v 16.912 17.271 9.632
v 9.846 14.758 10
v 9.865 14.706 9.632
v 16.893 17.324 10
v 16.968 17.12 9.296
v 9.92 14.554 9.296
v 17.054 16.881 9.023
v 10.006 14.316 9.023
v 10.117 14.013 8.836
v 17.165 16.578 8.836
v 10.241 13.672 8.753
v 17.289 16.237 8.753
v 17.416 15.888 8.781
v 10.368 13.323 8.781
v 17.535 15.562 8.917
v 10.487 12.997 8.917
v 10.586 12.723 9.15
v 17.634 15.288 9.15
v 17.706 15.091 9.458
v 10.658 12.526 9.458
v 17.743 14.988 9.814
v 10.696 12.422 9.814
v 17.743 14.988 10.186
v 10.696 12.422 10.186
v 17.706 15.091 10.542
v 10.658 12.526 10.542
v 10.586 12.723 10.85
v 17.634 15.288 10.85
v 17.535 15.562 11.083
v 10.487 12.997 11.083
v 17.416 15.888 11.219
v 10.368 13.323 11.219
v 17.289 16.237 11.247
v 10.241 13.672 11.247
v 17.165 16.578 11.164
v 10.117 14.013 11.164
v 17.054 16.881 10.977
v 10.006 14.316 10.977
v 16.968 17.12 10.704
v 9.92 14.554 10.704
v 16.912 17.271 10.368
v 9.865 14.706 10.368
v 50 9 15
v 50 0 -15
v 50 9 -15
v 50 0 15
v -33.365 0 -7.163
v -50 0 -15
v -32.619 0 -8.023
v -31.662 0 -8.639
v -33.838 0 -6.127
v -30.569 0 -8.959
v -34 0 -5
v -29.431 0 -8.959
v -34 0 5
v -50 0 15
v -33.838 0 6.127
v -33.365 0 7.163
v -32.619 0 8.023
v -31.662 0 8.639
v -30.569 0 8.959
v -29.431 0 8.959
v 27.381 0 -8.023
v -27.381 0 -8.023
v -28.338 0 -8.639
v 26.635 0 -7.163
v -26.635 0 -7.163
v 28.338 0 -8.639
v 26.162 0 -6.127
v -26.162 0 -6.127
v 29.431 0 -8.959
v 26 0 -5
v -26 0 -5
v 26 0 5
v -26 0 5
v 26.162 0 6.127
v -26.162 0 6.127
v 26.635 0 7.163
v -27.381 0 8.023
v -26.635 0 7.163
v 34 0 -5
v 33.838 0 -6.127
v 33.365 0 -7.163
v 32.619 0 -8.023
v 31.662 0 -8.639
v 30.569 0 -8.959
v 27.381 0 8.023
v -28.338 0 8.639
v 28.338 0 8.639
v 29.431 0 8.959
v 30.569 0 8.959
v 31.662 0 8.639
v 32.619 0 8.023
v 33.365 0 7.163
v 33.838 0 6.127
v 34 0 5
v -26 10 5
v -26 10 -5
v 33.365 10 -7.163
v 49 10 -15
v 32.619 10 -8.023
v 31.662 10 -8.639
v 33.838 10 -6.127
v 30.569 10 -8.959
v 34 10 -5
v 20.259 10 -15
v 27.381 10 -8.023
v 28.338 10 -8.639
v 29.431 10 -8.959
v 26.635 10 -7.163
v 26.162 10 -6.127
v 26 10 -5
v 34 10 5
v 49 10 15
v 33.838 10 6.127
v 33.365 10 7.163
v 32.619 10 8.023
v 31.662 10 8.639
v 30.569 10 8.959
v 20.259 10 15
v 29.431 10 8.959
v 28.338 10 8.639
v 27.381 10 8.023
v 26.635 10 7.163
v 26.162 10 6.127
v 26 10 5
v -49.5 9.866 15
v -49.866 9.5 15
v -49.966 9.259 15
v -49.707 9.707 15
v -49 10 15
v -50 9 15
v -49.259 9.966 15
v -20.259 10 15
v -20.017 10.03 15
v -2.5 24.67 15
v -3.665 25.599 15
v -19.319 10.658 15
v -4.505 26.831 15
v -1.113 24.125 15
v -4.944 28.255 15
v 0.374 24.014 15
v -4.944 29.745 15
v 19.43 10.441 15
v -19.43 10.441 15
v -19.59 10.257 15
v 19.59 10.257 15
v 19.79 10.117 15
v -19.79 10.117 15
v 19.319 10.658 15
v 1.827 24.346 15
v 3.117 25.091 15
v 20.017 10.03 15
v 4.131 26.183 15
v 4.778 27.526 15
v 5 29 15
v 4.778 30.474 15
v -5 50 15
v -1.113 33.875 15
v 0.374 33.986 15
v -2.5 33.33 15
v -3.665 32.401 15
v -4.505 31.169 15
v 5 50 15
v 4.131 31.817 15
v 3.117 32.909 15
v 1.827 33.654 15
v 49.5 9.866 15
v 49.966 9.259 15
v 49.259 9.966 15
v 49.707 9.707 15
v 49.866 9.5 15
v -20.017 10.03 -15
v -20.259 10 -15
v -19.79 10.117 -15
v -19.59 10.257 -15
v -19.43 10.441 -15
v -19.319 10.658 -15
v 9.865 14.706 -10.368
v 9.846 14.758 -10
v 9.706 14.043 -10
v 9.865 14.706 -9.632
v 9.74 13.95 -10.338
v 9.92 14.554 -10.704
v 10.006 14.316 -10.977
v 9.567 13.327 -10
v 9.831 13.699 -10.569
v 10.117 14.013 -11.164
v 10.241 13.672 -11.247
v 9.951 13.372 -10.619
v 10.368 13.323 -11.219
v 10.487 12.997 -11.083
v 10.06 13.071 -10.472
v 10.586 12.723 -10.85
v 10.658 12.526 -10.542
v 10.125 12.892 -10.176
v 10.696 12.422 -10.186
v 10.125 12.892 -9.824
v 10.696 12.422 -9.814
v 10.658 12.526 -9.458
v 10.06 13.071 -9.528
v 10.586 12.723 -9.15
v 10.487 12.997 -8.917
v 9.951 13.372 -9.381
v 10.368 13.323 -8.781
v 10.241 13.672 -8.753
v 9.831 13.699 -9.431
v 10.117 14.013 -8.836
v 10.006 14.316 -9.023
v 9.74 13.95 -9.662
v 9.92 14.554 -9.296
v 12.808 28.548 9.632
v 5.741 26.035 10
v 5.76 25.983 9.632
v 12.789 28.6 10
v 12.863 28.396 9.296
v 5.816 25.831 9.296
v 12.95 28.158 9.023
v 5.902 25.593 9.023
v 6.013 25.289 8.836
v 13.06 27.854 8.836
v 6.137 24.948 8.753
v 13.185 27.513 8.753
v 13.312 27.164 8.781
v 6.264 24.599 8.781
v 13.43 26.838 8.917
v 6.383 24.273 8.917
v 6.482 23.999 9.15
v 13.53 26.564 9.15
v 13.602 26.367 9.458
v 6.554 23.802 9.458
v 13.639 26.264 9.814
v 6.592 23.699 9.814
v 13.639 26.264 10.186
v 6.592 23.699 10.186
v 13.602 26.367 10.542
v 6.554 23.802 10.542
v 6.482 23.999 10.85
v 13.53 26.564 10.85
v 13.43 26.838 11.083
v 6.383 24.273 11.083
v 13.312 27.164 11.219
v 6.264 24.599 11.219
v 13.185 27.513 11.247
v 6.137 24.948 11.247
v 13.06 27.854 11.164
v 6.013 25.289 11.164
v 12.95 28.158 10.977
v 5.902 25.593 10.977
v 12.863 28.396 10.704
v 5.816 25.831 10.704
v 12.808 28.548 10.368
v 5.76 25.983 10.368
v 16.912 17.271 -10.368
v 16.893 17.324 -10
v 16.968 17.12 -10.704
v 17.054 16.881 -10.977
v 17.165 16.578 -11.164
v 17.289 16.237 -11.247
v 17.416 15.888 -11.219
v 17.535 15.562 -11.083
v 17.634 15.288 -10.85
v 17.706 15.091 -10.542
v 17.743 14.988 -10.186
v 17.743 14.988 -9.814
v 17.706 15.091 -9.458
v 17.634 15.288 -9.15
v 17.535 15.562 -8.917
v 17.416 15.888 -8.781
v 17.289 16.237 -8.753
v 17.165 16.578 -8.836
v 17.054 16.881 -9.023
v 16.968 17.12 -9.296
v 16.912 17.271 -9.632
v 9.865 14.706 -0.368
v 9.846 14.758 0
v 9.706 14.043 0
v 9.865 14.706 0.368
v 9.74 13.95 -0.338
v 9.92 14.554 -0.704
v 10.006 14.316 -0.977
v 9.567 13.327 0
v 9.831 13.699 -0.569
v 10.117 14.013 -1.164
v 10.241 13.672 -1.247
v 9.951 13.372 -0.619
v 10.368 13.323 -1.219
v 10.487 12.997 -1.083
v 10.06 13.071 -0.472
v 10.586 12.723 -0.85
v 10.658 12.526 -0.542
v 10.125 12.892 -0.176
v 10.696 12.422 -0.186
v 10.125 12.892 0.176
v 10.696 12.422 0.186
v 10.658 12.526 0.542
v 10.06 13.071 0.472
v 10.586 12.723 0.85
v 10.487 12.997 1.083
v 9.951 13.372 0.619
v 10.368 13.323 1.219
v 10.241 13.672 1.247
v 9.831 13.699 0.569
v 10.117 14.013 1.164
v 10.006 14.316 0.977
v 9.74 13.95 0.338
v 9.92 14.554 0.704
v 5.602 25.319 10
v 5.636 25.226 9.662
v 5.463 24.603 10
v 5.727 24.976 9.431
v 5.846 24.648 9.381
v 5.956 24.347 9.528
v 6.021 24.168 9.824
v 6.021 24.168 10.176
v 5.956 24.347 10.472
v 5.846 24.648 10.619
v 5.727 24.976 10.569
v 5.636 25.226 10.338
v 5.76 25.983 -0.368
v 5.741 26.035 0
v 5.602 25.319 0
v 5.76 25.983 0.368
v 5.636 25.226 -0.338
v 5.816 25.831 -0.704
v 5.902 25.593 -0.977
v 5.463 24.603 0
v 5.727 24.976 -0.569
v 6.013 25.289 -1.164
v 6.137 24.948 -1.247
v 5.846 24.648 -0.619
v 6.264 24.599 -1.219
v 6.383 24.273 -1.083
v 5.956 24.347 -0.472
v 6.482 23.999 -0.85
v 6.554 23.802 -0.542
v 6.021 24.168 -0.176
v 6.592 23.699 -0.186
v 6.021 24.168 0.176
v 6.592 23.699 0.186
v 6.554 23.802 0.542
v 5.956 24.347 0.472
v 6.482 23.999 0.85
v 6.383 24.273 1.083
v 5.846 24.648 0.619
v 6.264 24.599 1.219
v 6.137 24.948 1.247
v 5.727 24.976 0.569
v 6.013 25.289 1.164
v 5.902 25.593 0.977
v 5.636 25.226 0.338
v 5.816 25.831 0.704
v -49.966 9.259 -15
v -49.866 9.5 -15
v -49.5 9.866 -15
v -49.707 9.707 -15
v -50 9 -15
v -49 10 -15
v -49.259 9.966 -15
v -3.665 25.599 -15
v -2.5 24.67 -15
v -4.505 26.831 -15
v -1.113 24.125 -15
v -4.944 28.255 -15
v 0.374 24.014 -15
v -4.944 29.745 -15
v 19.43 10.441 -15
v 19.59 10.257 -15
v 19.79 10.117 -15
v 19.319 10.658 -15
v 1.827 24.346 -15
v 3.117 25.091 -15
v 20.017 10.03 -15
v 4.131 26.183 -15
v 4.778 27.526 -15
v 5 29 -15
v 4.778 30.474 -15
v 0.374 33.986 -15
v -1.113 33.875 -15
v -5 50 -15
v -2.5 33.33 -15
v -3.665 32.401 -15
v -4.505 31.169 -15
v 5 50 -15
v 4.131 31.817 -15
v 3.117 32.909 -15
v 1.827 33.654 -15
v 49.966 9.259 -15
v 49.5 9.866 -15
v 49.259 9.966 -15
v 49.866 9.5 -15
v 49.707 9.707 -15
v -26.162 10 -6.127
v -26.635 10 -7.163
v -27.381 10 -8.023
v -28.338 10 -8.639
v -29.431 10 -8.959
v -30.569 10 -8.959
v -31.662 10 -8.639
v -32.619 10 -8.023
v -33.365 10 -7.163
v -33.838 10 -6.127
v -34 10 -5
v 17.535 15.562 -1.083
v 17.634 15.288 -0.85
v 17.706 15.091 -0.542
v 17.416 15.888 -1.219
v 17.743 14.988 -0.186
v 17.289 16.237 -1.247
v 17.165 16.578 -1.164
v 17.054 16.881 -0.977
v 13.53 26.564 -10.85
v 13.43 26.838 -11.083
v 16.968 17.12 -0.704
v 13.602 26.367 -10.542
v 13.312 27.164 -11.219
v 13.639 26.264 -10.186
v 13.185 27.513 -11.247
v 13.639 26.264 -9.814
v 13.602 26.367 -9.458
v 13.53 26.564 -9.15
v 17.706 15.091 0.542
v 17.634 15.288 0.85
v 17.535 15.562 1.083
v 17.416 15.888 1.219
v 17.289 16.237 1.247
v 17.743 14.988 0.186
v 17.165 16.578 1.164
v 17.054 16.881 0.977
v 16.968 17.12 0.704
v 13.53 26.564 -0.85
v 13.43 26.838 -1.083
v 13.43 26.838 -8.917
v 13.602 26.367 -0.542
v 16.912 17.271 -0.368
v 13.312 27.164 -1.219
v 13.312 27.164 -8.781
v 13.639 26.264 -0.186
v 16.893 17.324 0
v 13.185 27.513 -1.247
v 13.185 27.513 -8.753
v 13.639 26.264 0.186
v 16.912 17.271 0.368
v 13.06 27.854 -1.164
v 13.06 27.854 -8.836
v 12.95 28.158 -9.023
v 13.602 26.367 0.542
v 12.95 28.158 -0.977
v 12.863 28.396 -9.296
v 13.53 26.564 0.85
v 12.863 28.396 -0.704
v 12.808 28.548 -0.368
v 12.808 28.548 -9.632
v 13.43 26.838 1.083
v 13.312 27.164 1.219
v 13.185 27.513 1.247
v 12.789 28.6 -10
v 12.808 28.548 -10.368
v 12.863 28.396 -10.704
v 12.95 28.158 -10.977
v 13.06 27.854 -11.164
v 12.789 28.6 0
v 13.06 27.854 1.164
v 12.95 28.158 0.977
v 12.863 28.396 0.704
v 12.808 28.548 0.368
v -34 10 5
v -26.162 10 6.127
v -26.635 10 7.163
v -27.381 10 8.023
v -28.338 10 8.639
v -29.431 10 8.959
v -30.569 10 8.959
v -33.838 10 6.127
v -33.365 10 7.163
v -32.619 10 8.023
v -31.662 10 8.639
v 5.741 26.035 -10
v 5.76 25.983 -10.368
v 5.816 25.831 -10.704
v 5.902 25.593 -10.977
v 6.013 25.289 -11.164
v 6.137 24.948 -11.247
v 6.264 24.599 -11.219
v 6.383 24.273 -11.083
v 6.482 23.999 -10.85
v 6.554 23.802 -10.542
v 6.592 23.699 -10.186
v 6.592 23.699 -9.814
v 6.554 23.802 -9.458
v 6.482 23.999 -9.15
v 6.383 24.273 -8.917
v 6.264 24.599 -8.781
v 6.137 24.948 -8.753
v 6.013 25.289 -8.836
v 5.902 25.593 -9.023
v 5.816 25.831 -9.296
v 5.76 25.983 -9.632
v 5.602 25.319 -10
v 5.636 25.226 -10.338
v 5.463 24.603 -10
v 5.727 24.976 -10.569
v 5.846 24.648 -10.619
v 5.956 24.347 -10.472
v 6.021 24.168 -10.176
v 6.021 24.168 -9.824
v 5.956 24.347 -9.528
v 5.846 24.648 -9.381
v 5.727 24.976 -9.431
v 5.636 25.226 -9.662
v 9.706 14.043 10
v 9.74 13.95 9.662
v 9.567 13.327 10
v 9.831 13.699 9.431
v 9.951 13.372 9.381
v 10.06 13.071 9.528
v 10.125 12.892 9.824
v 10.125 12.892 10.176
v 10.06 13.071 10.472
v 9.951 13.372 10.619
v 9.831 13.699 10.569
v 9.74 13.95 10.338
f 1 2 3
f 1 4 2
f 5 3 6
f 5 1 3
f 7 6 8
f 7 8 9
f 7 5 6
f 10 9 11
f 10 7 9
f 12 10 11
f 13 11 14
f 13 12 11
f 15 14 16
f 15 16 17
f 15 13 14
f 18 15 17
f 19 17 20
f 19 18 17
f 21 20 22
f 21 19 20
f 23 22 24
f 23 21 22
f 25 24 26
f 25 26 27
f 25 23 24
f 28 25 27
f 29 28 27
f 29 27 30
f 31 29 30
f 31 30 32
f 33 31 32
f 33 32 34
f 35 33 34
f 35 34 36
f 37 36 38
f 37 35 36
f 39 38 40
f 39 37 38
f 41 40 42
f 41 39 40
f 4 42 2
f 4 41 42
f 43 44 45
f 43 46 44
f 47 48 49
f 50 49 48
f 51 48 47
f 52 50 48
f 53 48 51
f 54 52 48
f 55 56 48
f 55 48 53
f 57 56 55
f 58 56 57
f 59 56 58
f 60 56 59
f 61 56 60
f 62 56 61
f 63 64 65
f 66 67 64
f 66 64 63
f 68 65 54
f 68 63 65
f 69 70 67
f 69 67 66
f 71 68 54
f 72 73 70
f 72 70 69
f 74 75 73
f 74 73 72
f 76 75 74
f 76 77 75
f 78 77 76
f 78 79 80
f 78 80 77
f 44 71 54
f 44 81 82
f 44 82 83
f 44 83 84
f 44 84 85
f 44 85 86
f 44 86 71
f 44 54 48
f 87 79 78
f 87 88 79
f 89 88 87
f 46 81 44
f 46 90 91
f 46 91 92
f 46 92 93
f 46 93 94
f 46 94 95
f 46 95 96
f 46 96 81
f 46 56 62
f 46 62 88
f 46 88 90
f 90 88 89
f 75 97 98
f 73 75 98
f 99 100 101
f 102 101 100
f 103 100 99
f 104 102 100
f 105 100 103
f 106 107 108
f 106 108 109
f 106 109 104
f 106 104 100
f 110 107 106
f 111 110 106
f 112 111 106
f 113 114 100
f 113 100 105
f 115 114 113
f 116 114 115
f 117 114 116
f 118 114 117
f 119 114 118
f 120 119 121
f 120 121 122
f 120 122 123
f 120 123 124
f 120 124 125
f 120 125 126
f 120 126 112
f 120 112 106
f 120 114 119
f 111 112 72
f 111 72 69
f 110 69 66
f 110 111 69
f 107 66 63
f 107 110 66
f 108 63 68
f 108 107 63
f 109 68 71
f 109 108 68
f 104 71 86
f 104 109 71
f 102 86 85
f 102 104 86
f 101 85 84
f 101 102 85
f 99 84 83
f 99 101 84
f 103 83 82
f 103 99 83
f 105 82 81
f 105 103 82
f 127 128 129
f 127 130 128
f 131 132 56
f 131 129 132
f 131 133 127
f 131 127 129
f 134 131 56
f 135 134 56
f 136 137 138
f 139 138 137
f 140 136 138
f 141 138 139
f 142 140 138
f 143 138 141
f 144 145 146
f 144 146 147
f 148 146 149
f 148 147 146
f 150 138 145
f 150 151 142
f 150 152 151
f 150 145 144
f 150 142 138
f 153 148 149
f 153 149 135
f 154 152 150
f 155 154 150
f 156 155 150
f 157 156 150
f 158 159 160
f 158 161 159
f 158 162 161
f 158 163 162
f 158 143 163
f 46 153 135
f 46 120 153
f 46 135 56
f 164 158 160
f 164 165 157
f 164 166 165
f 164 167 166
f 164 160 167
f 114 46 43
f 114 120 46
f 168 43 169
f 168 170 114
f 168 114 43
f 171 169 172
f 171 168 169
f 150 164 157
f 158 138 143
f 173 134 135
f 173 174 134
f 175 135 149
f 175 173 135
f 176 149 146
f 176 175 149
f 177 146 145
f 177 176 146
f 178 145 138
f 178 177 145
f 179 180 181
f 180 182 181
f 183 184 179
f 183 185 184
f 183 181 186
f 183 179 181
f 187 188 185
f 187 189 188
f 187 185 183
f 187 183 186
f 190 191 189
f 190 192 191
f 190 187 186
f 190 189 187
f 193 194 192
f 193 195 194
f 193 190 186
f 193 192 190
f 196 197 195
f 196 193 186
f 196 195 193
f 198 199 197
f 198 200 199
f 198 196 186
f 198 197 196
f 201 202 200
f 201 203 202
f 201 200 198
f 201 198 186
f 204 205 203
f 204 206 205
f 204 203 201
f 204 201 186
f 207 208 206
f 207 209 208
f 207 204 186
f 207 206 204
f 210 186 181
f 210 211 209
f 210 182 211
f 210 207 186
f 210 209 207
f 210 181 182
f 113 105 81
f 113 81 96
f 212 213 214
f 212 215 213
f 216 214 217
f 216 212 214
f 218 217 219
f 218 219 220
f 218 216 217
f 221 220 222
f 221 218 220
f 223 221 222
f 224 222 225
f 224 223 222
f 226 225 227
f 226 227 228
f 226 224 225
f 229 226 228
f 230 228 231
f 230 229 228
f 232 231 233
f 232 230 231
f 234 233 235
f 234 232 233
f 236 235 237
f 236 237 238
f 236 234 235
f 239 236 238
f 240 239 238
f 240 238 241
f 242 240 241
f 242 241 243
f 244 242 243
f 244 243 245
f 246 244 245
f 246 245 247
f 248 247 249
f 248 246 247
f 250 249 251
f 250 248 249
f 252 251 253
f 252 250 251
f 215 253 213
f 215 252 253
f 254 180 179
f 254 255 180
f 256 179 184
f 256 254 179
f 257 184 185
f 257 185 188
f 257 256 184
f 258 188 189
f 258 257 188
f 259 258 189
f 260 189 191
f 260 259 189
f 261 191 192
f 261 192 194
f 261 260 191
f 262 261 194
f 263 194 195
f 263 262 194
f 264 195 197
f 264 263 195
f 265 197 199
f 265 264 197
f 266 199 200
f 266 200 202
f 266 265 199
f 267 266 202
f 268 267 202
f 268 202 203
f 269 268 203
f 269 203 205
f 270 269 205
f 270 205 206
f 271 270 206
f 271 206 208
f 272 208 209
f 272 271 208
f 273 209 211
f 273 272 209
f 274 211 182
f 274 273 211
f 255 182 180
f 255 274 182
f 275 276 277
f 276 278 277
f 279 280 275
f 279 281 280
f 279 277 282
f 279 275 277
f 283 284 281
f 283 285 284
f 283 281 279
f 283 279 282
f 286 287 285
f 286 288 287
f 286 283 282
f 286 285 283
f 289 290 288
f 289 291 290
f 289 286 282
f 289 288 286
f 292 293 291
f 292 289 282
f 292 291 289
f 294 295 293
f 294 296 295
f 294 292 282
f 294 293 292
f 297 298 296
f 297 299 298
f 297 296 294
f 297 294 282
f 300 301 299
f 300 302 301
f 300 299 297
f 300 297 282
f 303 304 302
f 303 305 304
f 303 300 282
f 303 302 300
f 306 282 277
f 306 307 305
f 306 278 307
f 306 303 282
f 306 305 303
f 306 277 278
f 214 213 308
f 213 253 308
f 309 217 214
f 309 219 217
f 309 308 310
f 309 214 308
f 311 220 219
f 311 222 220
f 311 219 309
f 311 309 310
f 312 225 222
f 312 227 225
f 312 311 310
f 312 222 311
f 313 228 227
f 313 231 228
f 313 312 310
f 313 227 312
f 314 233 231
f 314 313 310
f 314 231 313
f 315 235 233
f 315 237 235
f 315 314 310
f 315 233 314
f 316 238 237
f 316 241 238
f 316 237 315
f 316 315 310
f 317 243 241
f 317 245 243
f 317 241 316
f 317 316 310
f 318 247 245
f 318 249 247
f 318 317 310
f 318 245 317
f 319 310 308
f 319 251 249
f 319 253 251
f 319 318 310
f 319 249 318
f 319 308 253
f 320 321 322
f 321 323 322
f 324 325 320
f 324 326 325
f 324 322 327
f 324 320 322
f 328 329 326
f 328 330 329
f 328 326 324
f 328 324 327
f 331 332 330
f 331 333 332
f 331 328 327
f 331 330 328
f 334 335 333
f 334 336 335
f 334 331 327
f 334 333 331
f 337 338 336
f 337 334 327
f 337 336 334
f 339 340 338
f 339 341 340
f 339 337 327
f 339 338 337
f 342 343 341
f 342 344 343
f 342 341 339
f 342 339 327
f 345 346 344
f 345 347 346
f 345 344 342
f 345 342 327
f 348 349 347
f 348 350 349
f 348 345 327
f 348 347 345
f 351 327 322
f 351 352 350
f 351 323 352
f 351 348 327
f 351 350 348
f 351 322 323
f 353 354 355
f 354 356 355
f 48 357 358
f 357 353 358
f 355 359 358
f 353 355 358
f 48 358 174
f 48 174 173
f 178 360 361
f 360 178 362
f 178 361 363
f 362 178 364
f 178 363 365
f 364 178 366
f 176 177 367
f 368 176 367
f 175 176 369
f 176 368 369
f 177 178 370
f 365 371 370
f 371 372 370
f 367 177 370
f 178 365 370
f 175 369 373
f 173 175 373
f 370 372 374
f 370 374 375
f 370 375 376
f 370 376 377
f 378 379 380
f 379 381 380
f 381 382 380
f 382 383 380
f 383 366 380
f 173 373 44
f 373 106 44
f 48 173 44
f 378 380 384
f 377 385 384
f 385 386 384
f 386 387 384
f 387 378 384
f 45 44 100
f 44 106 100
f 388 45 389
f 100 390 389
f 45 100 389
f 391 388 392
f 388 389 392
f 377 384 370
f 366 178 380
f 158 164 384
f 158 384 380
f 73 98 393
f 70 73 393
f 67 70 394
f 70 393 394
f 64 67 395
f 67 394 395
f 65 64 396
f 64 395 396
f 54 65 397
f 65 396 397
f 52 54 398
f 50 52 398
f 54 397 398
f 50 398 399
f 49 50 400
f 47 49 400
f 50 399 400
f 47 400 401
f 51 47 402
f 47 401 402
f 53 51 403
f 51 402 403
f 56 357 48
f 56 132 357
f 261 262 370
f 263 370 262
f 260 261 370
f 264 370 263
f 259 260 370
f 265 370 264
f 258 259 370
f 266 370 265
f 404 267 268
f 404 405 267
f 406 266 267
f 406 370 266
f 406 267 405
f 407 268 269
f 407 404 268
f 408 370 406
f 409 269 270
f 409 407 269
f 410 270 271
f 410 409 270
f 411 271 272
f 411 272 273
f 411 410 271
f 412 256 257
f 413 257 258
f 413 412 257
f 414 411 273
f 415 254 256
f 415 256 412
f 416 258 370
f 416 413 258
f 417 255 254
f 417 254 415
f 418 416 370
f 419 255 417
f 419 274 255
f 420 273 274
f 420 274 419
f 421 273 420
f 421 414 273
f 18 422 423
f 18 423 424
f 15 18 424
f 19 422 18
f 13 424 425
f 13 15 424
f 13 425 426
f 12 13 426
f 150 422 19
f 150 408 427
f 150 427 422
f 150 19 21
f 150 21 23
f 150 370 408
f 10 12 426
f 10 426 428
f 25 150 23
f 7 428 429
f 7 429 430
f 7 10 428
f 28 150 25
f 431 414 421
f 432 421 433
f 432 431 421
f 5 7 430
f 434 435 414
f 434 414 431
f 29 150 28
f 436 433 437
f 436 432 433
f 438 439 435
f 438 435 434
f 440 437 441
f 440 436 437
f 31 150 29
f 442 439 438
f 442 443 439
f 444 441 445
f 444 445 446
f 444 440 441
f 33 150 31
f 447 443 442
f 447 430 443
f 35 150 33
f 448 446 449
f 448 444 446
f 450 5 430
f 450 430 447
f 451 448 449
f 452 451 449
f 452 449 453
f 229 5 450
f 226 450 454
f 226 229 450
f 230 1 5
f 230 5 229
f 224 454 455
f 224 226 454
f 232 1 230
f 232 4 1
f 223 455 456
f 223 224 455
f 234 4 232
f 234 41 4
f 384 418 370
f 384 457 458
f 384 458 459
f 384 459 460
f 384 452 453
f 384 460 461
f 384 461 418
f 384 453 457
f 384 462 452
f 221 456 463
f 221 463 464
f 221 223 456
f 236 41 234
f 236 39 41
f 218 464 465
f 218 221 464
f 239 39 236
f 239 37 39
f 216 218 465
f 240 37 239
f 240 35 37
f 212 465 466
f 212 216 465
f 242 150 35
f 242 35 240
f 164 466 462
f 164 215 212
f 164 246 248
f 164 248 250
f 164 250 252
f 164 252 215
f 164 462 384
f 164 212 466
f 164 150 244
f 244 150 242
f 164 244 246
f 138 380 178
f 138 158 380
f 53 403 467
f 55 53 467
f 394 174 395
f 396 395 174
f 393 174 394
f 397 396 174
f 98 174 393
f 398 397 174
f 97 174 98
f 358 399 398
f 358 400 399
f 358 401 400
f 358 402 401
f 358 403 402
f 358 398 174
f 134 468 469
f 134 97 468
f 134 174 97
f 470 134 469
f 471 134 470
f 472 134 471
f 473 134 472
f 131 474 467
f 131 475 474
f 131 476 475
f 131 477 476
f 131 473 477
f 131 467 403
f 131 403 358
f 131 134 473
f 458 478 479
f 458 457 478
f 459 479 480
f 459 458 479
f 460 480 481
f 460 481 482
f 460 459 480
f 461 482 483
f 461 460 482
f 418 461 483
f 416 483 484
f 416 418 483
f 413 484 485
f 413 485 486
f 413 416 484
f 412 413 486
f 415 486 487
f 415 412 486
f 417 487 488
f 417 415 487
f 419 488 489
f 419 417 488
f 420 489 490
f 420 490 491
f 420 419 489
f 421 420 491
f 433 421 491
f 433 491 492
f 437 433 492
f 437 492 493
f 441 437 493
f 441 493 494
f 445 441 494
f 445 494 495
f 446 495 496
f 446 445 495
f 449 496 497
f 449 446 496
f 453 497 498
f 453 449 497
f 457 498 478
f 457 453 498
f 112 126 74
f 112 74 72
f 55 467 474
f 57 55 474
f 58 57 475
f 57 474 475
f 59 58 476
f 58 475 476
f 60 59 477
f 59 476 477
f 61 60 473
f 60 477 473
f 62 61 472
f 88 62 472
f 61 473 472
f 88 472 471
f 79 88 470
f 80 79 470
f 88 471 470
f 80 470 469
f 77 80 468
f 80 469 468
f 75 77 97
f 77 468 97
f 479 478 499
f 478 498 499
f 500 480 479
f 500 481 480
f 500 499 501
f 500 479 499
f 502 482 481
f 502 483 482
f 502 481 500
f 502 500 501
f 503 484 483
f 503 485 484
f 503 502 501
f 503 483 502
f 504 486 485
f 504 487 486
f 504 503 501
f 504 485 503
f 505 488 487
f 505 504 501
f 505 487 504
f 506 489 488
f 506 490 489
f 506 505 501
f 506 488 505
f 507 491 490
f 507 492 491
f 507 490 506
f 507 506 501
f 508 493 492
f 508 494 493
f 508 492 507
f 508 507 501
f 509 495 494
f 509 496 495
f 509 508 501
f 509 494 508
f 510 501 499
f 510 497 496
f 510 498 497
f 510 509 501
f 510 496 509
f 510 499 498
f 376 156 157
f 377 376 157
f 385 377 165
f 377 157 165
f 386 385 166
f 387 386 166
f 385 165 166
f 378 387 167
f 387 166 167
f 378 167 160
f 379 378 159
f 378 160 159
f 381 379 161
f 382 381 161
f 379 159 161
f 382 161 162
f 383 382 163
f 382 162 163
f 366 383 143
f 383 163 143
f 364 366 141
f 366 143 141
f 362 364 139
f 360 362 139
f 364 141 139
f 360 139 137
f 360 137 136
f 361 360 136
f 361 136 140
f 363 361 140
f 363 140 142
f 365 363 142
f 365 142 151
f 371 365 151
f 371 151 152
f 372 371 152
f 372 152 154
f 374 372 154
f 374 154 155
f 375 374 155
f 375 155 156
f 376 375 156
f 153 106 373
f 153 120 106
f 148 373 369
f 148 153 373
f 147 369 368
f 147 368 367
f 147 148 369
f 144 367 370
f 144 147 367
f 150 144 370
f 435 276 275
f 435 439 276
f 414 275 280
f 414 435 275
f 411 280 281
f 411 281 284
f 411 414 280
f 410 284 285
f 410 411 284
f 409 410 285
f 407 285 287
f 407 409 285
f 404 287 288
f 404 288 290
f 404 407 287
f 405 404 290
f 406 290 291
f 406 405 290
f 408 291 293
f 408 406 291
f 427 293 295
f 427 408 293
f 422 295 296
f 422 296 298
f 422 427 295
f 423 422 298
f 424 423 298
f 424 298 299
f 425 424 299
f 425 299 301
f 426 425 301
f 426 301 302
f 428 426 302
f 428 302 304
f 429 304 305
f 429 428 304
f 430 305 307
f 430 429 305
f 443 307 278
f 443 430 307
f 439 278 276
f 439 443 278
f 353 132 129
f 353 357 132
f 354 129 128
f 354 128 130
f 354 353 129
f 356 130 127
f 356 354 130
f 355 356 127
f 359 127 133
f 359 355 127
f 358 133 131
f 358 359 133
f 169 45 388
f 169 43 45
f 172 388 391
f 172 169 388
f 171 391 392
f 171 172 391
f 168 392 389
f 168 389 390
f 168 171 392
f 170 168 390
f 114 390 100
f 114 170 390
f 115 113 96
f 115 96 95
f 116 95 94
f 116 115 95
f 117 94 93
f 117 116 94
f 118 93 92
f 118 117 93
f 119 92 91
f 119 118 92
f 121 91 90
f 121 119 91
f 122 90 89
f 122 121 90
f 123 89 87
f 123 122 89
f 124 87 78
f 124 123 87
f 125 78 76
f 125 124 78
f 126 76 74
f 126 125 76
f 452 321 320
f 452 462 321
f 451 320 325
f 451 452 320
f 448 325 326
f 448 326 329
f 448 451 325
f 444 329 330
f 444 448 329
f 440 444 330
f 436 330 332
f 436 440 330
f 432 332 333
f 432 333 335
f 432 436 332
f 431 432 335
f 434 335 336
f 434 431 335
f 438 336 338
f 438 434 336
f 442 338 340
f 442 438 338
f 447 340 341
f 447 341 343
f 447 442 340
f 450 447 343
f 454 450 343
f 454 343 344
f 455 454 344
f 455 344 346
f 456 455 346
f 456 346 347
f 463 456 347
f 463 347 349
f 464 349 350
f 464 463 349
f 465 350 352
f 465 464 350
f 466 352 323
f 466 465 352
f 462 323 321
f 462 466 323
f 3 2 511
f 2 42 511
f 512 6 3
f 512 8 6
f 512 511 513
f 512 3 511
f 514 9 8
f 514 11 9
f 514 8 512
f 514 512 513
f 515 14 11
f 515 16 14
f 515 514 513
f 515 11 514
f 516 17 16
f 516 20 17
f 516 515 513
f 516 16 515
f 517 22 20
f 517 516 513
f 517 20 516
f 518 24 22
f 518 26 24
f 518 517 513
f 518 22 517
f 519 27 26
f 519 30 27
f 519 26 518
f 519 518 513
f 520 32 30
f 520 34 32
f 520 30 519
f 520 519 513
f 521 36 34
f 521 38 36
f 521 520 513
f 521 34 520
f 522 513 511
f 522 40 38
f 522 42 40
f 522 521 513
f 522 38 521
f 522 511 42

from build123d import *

# Parameters (mm, degrees)
BASE_EXTRUDE_DEPTH   = 15
SLOT_CUT_DEPTH       = 66.76473219
SKETCH3_R            = 5
GUIDE_HOLE_DEPTH     = 77.811457479
LPATTERN1_COUNT      = 3
LPATTERN1_PITCH      = 10
LPATTERN1_COUNT_DIR2 = 2
LPATTERN1_PITCH_DIR2 = 12
FILLET1_R            = 1


with BuildPart() as part:
    # Sketch1 → Base Extrude (new, symmetric)
    with BuildSketch(Plane.XY):
        Polygon((-50, 0), (50, 0), (50, 10), (19.558809371, 10), (5, 50), (-5, 50), (-19.558809371, 10), (-50, 10), align=None)
    extrude(amount=BASE_EXTRUDE_DEPTH, both=True)

    # Sketch2 → Slot Cut (cut, through all)
    with BuildSketch(Plane(origin=(0, 10, 0), x_dir=(1, 0, 0), z_dir=(0, 1, 0))):
        with BuildLine():
            Line((26, -5), (26, 5))
            ThreePointArc((26, 5), (30, 9), (34, 5))
            Line((34, 5), (34, -5))
            ThreePointArc((34, -5), (30, -9), (26, -5))
        make_face()
    slot_cut = extrude(amount=-SLOT_CUT_DEPTH, mode=Mode.SUBTRACT)

    # Mirror1: Slot Cut across plane
    add(slot_cut.mirror(Plane(origin=(0, 0, 0), x_dir=(0, 0, 1), z_dir=(1, 0, 0))), mode=Mode.SUBTRACT)

    # Sketch3 → Guide hole (cut, through all)
    with BuildSketch(Plane.XY.offset(15)):
        with Locations((0, 29)):
            Circle(SKETCH3_R)
    extrude(amount=-GUIDE_HOLE_DEPTH, mode=Mode.SUBTRACT)

    # Sketch10 → M3x0.5 Tapped Hole3 (revolve, cut)
    with BuildSketch(Plane(origin=(13.216501869, 27.425346647, 10), x_dir=(-0.3420201433256727, 0.939692620785907, 0), z_dir=(0, 0, 1))):
        Polygon((0, 0), (0, 8.251075774), (1.25, 7.5), (1.25, 0), align=None)
    m3x0_5_tapped_hole3 = revolve(axis=Axis((19.183550011, 29.597174557, 10), (-0.9396926207859069, -0.34202014332567277, 0)), mode=Mode.SUBTRACT)

    # LPattern1: M3x0.5 Tapped Hole3 3 × 2
    with Locations(*[Vector(0, 0, -1) * (i * LPATTERN1_PITCH) + Vector(0.34202014332567293, -0.9396926207859069, 0) * (j * LPATTERN1_PITCH_DIR2) for i in range(LPATTERN1_COUNT) for j in range(LPATTERN1_COUNT_DIR2) if (i, j) != (0, 0)]):
        add(m3x0_5_tapped_hole3, mode=Mode.SUBTRACT)

    # Fillet1
    fillet1_edges = [part.edges().sort_by_distance(p)[0] for p in [
        (-50, 10, 0),
        (-19.558809371, 10, 0),
        (19.558809371, 10, 0),
        (50, 10, 0),
    ]]
    fillet(fillet1_edges, radius=FILLET1_R)


solid = part.part
